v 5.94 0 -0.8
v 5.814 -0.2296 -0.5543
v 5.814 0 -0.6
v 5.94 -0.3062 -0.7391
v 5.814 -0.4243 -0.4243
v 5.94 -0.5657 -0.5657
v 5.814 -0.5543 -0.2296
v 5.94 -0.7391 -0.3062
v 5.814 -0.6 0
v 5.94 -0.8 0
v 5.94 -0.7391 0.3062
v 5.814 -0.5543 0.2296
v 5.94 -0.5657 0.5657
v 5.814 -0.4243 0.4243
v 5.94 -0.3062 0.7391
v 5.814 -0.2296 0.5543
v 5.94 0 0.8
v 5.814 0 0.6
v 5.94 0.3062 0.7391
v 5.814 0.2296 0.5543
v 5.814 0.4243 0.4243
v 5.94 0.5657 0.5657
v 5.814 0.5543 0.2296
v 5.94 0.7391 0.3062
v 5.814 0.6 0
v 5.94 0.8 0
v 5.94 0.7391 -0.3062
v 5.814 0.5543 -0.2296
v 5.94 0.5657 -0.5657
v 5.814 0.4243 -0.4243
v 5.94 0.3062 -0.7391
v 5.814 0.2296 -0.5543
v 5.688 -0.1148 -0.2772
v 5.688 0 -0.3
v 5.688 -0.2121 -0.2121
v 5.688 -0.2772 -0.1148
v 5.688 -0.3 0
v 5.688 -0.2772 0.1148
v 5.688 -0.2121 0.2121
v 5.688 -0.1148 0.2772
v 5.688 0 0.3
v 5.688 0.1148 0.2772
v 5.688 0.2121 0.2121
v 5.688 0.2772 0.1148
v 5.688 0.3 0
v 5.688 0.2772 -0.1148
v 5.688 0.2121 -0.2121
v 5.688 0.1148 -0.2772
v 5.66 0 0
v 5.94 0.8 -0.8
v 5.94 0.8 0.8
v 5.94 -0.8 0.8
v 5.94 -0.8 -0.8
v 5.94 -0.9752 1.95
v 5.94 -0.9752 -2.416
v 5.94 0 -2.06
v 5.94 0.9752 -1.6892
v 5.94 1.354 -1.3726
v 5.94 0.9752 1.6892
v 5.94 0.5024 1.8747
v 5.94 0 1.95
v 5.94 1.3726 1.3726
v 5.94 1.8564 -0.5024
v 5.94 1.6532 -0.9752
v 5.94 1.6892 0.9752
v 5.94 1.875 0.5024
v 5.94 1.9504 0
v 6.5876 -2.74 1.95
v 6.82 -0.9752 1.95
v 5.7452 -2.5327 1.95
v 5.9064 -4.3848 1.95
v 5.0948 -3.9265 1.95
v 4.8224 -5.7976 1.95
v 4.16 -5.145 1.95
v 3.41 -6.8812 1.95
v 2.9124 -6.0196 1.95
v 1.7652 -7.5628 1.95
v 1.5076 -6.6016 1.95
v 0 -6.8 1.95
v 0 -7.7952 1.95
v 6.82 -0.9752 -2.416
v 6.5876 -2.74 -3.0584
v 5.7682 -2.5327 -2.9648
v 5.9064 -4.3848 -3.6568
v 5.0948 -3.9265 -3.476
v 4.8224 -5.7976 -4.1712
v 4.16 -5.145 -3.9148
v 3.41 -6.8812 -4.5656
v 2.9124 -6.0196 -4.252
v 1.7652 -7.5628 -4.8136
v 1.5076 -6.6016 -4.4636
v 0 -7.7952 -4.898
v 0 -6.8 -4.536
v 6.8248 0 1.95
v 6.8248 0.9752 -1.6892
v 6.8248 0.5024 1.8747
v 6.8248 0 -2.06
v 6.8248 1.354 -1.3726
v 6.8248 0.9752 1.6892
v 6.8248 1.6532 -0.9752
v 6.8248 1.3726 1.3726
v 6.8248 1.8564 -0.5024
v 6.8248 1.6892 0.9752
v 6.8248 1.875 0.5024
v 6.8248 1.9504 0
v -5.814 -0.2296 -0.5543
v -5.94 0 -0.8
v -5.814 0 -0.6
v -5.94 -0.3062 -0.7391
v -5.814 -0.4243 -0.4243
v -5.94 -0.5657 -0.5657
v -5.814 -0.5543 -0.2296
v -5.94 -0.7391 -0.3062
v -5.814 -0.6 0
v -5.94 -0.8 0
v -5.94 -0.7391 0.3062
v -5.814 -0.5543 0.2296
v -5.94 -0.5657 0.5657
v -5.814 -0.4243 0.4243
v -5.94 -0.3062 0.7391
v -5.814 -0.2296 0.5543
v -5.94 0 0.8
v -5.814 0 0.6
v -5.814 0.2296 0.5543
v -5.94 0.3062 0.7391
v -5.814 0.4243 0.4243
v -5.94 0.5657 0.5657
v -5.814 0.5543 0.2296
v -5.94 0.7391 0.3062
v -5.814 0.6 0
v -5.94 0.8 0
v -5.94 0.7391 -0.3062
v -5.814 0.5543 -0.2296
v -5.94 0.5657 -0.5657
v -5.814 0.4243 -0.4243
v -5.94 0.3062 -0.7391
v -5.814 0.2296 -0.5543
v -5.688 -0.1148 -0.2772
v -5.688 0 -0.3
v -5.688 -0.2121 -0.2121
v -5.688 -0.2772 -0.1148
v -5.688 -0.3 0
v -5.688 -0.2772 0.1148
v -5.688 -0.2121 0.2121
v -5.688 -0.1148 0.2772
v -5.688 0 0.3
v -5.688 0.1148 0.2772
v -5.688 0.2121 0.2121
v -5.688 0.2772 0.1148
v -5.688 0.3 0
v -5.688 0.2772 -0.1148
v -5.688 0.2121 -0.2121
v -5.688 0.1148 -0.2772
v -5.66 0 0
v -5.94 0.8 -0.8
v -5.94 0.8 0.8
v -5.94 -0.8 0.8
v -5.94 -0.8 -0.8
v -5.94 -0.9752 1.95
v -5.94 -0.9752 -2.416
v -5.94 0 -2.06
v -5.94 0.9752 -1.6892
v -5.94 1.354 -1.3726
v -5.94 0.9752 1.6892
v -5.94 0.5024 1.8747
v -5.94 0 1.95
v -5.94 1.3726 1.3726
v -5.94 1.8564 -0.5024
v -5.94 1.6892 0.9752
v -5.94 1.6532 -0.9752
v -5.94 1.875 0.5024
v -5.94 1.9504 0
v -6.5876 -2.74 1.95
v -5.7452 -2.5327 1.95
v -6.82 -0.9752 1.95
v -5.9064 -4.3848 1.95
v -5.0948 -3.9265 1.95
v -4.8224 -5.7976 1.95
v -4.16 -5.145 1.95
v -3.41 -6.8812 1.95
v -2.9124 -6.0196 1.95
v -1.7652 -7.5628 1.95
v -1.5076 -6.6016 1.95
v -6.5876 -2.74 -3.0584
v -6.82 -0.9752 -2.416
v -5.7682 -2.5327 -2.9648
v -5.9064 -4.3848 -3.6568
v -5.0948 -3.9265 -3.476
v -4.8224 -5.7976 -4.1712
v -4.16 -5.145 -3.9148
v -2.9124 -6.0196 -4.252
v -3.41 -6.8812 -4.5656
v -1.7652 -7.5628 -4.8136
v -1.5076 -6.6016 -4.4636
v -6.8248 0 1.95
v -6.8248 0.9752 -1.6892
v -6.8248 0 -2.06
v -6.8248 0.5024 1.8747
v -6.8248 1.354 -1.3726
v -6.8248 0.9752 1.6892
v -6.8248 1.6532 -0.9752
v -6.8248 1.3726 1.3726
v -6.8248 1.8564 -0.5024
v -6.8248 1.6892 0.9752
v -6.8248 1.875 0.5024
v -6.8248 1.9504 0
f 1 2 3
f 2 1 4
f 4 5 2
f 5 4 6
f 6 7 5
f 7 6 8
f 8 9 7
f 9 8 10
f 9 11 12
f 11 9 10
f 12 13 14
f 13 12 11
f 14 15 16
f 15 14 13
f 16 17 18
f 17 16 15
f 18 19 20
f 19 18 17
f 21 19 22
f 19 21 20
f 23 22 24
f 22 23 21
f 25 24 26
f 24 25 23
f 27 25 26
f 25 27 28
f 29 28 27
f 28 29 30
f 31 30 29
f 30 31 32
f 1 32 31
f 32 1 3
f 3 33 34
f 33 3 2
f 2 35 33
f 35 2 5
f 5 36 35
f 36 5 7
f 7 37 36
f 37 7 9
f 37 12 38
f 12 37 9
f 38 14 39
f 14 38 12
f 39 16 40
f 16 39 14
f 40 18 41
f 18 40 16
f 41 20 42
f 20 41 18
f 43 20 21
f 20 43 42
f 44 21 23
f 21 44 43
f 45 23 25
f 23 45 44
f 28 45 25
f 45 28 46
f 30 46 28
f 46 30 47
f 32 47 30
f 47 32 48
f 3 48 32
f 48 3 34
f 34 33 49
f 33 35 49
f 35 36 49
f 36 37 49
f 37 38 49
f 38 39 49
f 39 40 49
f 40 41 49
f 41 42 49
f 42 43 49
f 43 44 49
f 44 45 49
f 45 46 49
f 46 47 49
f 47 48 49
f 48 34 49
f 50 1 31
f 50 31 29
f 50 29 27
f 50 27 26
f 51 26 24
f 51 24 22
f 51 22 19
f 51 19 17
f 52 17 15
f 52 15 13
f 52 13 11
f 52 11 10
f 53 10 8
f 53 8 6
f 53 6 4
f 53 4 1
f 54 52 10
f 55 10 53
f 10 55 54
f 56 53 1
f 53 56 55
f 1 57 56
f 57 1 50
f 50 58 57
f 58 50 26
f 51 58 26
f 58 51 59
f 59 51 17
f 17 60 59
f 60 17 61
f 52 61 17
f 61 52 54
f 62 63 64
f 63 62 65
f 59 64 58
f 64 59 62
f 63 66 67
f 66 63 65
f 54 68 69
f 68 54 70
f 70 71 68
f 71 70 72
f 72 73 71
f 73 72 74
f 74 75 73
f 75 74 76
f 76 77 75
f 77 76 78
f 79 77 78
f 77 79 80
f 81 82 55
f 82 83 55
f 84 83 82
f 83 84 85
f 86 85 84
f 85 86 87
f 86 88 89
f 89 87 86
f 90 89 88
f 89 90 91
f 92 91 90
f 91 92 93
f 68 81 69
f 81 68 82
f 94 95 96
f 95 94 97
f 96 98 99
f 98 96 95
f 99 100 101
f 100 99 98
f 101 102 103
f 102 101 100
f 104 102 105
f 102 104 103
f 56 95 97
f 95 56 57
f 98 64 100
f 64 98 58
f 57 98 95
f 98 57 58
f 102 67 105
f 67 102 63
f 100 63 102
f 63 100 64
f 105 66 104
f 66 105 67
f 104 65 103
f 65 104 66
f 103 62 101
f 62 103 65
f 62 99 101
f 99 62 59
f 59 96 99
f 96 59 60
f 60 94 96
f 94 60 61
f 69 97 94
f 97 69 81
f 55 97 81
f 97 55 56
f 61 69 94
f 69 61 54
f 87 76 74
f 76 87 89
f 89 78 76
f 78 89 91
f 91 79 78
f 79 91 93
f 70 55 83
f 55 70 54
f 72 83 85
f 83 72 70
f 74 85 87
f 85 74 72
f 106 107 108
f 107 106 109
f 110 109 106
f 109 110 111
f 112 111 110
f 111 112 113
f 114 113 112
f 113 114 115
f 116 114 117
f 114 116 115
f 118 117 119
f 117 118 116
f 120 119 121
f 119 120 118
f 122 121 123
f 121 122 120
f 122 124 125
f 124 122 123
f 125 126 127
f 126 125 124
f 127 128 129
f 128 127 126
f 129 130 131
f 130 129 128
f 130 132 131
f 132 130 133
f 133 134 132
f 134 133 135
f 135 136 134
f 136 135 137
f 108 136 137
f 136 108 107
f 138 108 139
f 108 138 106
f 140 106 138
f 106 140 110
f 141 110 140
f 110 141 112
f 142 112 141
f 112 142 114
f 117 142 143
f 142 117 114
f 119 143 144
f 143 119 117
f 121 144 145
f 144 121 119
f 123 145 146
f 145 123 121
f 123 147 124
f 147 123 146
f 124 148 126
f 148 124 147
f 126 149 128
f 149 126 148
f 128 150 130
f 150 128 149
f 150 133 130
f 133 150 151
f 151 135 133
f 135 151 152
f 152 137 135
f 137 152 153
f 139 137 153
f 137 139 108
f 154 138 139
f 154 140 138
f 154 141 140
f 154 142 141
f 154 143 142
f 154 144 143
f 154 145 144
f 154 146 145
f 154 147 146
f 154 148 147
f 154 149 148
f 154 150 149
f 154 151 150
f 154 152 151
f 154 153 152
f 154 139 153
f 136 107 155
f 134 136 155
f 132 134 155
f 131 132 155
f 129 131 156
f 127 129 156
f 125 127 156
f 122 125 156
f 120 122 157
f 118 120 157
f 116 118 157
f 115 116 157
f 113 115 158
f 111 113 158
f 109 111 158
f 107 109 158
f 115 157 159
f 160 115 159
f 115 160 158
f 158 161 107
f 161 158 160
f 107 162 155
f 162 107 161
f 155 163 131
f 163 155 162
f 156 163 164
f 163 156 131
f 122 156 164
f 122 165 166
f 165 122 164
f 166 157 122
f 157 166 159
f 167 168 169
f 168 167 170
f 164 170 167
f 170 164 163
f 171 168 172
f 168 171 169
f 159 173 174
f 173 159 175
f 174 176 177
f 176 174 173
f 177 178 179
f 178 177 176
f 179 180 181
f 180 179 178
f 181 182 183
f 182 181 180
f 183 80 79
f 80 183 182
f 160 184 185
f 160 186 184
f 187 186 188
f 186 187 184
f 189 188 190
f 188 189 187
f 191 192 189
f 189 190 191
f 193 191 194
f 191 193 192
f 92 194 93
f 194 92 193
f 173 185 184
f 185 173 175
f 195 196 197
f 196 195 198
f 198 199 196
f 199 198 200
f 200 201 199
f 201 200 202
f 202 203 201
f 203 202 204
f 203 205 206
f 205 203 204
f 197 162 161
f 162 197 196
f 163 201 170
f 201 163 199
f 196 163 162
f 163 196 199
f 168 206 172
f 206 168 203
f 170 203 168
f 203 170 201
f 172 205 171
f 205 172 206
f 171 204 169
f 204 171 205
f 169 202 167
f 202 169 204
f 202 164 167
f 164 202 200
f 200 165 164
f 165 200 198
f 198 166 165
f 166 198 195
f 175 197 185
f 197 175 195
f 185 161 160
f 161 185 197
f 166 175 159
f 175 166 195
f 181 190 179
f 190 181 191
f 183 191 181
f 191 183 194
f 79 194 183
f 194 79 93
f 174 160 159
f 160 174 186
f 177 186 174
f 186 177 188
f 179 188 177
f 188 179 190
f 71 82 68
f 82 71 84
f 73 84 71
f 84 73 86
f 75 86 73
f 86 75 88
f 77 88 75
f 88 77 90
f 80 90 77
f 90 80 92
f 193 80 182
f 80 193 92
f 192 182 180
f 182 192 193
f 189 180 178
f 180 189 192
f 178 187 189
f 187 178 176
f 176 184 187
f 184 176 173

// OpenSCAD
// file: ../p/4-4edge.scad
use <../lib.scad>
function ldraw_lib__4_4edge() = [
// 0 Circle 1.0
// 0 Name: 4-4edge.dat
// 0 Author: James Jessiman
// 0 !LDRAW_ORG Primitive UPDATE 2017-01
// 0 !LICENSE Licensed under CC BY 2.0 and CC BY 4.0 : see CAreadme.txt
// 
// 0 BFC CERTIFY CCW
  [0,"BFC","CERTIFY"],
  [0,"BFC","CCW"],
// 
// 0 !HISTORY 1998-12-15 [PTadmin] Official Update 1998-10
// 0 !HISTORY 2005-12-28 [PTadmin] Official Update 2005-01
// 0 !HISTORY 2007-06-24 [PTadmin] Header formatted for Contributor Agreement
// 0 !HISTORY 2008-07-01 [PTadmin] Official Update 2008-01
// 0 !HISTORY 2017-01-15 [Steffen] BFCed
// 0 !HISTORY 2017-12-30 [PTadmin] Official Update 2017-01
// 
// 
// 2 24 1 0 0 0.9239 0 0.3827
  [2,24,1,0,0,0.9239,0,0.3827],
// 2 24 0.9239 0 0.3827 0.7071 0 0.7071
  [2,24,0.9239,0,0.3827,0.7071,0,0.7071],
// 2 24 0.7071 0 0.7071 0.3827 0 0.9239
  [2,24,0.7071,0,0.7071,0.3827,0,0.9239],
// 2 24 0.3827 0 0.9239 0 0 1
  [2,24,0.3827,0,0.9239,0,0,1],
// 2 24 0 0 1 -0.3827 0 0.9239
  [2,24,0,0,1,-0.3827,0,0.9239],
// 2 24 -0.3827 0 0.9239 -0.7071 0 0.7071
  [2,24,-0.3827,0,0.9239,-0.7071,0,0.7071],
// 2 24 -0.7071 0 0.7071 -0.9239 0 0.3827
  [2,24,-0.7071,0,0.7071,-0.9239,0,0.3827],
// 2 24 -0.9239 0 0.3827 -1 0 -0
  [2,24,-0.9239,0,0.3827,-1,0,-0],
// 2 24 -1 0 -0 -0.9239 0 -0.3827
  [2,24,-1,0,-0,-0.9239,0,-0.3827],
// 2 24 -0.9239 0 -0.3827 -0.7071 0 -0.7071
  [2,24,-0.9239,0,-0.3827,-0.7071,0,-0.7071],
// 2 24 -0.7071 0 -0.7071 -0.3827 0 -0.9239
  [2,24,-0.7071,0,-0.7071,-0.3827,0,-0.9239],
// 2 24 -0.3827 0 -0.9239 0 0 -1
  [2,24,-0.3827,0,-0.9239,0,0,-1],
// 2 24 0 0 -1 0.3827 0 -0.9239
  [2,24,0,0,-1,0.3827,0,-0.9239],
// 2 24 0.3827 0 -0.9239 0.7071 0 -0.7071
  [2,24,0.3827,0,-0.9239,0.7071,0,-0.7071],
// 2 24 0.7071 0 -0.7071 0.9239 0 -0.3827
  [2,24,0.7071,0,-0.7071,0.9239,0,-0.3827],
// 2 24 0.9239 0 -0.3827 1 0 0
  [2,24,0.9239,0,-0.3827,1,0,0],
];
module ldraw_lib__4_4edge(step=0, col=false, unit=2/5, alt=false, line=0.2, solid=!$preview)
    makepoly(ldraw_lib__4_4edge(), step=step, col=col, unit=unit, alt=alt, line=line, solid=solid);
ldraw_lib__4_4edge(line=0.2);
// file: ../p/4-4con3.scad
use <../lib.scad>
function ldraw_lib__4_4con3() = [
// 0 Cone  3 x 1.0
// 0 Name: 4-4con3.dat
// 0 Author: Niels Karsdorp [nielsk]
// 0 !LDRAW_ORG Primitive UPDATE 2003-02
// 0 !LICENSE Licensed under CC BY 4.0 : see CAreadme.txt
// 
// 0 BFC CERTIFY CCW
  [0,"BFC","CERTIFY"],
  [0,"BFC","CCW"],
// 
// 0 !HISTORY 2003-08-01 [PTadmin] Official Update 2003-02
// 0 !HISTORY 2007-06-24 [PTadmin] Header formatted for Contributor Agreement
// 0 !HISTORY 2008-07-01 [PTadmin] Official Update 2008-01
// 
// 
// 5 24 3 1 0 4 0 0 2.7717 1 1.1481 2.7717 1 -1.1481
  [5,24,3,1,0,4,0,0,2.7717,1,1.1481,2.7717,1,-1.1481],
// 5 24 2.7717 1 1.1481 3.6956 0 1.5308 2.1213 1 2.1213 3 1 0
  [5,24,2.7717,1,1.1481,3.6956,0,1.5308,2.1213,1,2.1213,3,1,0],
// 5 24 2.1213 1 2.1213 2.8284 0 2.8284 1.1481 1 2.7717 2.7717 1 1.1481
  [5,24,2.1213,1,2.1213,2.8284,0,2.8284,1.1481,1,2.7717,2.7717,1,1.1481],
// 5 24 1.1481 1 2.7717 1.5308 0 3.6956 0 1 3 2.1213 1 2.1213
  [5,24,1.1481,1,2.7717,1.5308,0,3.6956,0,1,3,2.1213,1,2.1213],
// 5 24 0 1 3 0 0 4 -1.1481 1 2.7717 1.1481 1 2.7717
  [5,24,0,1,3,0,0,4,-1.1481,1,2.7717,1.1481,1,2.7717],
// 5 24 -1.1481 1 2.7717 -1.5308 0 3.6956 -2.1213 1 2.1213 0 1 3
  [5,24,-1.1481,1,2.7717,-1.5308,0,3.6956,-2.1213,1,2.1213,0,1,3],
// 5 24 -2.1213 1 2.1213 -2.8284 0 2.8284 -2.7717 1 1.1481 -1.1481 1 2.7717
  [5,24,-2.1213,1,2.1213,-2.8284,0,2.8284,-2.7717,1,1.1481,-1.1481,1,2.7717],
// 5 24 -2.7717 1 1.1481 -3.6956 0 1.5308 -3 1 0 -2.1213 1 2.1213
  [5,24,-2.7717,1,1.1481,-3.6956,0,1.5308,-3,1,0,-2.1213,1,2.1213],
// 5 24 -3 1 0 -4 0 0 -2.7717 1 -1.1481 -2.7717 1 1.1481
  [5,24,-3,1,0,-4,0,0,-2.7717,1,-1.1481,-2.7717,1,1.1481],
// 5 24 -2.7717 1 -1.1481 -3.6956 0 -1.5308 -2.1213 1 -2.1213 -3 1 0
  [5,24,-2.7717,1,-1.1481,-3.6956,0,-1.5308,-2.1213,1,-2.1213,-3,1,0],
// 5 24 -2.1213 1 -2.1213 -2.8284 0 -2.8284 -1.1481 1 -2.7717 -2.7717 1 -1.1481
  [5,24,-2.1213,1,-2.1213,-2.8284,0,-2.8284,-1.1481,1,-2.7717,-2.7717,1,-1.1481],
// 5 24 -1.1481 1 -2.7717 -1.5308 0 -3.6956 0 1 -3 -2.1213 1 -2.1213
  [5,24,-1.1481,1,-2.7717,-1.5308,0,-3.6956,0,1,-3,-2.1213,1,-2.1213],
// 5 24 0 1 -3 0 0 -4 1.1481 1 -2.7717 -1.1481 1 -2.7717
  [5,24,0,1,-3,0,0,-4,1.1481,1,-2.7717,-1.1481,1,-2.7717],
// 5 24 1.1481 1 -2.7717 1.5308 0 -3.6956 2.1213 1 -2.1213 0 1 -3
  [5,24,1.1481,1,-2.7717,1.5308,0,-3.6956,2.1213,1,-2.1213,0,1,-3],
// 5 24 2.1213 1 -2.1213 2.8284 0 -2.8284 2.7717 1 -1.1481 1.1481 1 -2.7717
  [5,24,2.1213,1,-2.1213,2.8284,0,-2.8284,2.7717,1,-1.1481,1.1481,1,-2.7717],
// 5 24 2.7717 1 -1.1481 3.6956 0 -1.5308 3 1 0 2.1213 1 -2.1213
  [5,24,2.7717,1,-1.1481,3.6956,0,-1.5308,3,1,0,2.1213,1,-2.1213],
// 
// 4 16 3 1 0 2.7717 1 1.1481 3.6956 0 1.5308 4 0 0
  [4,16,3,1,0,2.7717,1,1.1481,3.6956,0,1.5308,4,0,0],
// 4 16 2.7717 1 1.1481 2.1213 1 2.1213 2.8284 0 2.8284 3.6956 0 1.5308
  [4,16,2.7717,1,1.1481,2.1213,1,2.1213,2.8284,0,2.8284,3.6956,0,1.5308],
// 4 16 2.1213 1 2.1213 1.1481 1 2.7717 1.5308 0 3.6956 2.8284 0 2.8284
  [4,16,2.1213,1,2.1213,1.1481,1,2.7717,1.5308,0,3.6956,2.8284,0,2.8284],
// 4 16 1.1481 1 2.7717 0 1 3 0 0 4 1.5308 0 3.6956
  [4,16,1.1481,1,2.7717,0,1,3,0,0,4,1.5308,0,3.6956],
// 4 16 0 1 3 -1.1481 1 2.7717 -1.5308 0 3.6956 0 0 4
  [4,16,0,1,3,-1.1481,1,2.7717,-1.5308,0,3.6956,0,0,4],
// 4 16 -1.1481 1 2.7717 -2.1213 1 2.1213 -2.8284 0 2.8284 -1.5308 0 3.6956
  [4,16,-1.1481,1,2.7717,-2.1213,1,2.1213,-2.8284,0,2.8284,-1.5308,0,3.6956],
// 4 16 -2.1213 1 2.1213 -2.7717 1 1.1481 -3.6956 0 1.5308 -2.8284 0 2.8284
  [4,16,-2.1213,1,2.1213,-2.7717,1,1.1481,-3.6956,0,1.5308,-2.8284,0,2.8284],
// 4 16 -2.7717 1 1.1481 -3 1 0 -4 0 0 -3.6956 0 1.5308
  [4,16,-2.7717,1,1.1481,-3,1,0,-4,0,0,-3.6956,0,1.5308],
// 4 16 -3 1 0 -2.7717 1 -1.1481 -3.6956 0 -1.5308 -4 0 0
  [4,16,-3,1,0,-2.7717,1,-1.1481,-3.6956,0,-1.5308,-4,0,0],
// 4 16 -2.7717 1 -1.1481 -2.1213 1 -2.1213 -2.8284 0 -2.8284 -3.6956 0 -1.5308
  [4,16,-2.7717,1,-1.1481,-2.1213,1,-2.1213,-2.8284,0,-2.8284,-3.6956,0,-1.5308],
// 4 16 -2.1213 1 -2.1213 -1.1481 1 -2.7717 -1.5308 0 -3.6956 -2.8284 0 -2.8284
  [4,16,-2.1213,1,-2.1213,-1.1481,1,-2.7717,-1.5308,0,-3.6956,-2.8284,0,-2.8284],
// 4 16 -1.1481 1 -2.7717 0 1 -3 0 0 -4 -1.5308 0 -3.6956
  [4,16,-1.1481,1,-2.7717,0,1,-3,0,0,-4,-1.5308,0,-3.6956],
// 4 16 0 1 -3 1.1481 1 -2.7717 1.5308 0 -3.6956 0 0 -4
  [4,16,0,1,-3,1.1481,1,-2.7717,1.5308,0,-3.6956,0,0,-4],
// 4 16 1.1481 1 -2.7717 2.1213 1 -2.1213 2.8284 0 -2.8284 1.5308 0 -3.6956
  [4,16,1.1481,1,-2.7717,2.1213,1,-2.1213,2.8284,0,-2.8284,1.5308,0,-3.6956],
// 4 16 2.1213 1 -2.1213 2.7717 1 -1.1481 3.6956 0 -1.5308 2.8284 0 -2.8284
  [4,16,2.1213,1,-2.1213,2.7717,1,-1.1481,3.6956,0,-1.5308,2.8284,0,-2.8284],
// 4 16 2.7717 1 -1.1481 3 1 0 4 0 0 3.6956 0 -1.5308
  [4,16,2.7717,1,-1.1481,3,1,0,4,0,0,3.6956,0,-1.5308],
// 
// 0
// 
];
module ldraw_lib__4_4con3(step=0, col=false, unit=2/5, alt=false, line=0.2, solid=!$preview)
    makepoly(ldraw_lib__4_4con3(), step=step, col=col, unit=unit, alt=alt, line=line, solid=solid);
ldraw_lib__4_4con3(line=0.2);
// file: ../p/4-4con1.scad
use <../lib.scad>
function ldraw_lib__4_4con1() = [
// 0 Cone  1 x 1.0
// 0 Name: 4-4con1.dat
// 0 Author: Steve Bliss [sbliss]
// 0 !LDRAW_ORG Primitive UPDATE 2012-01
// 0 !LICENSE Licensed under CC BY 4.0 : see CAreadme.txt
// 
// 0 BFC CERTIFY CCW
  [0,"BFC","CERTIFY"],
  [0,"BFC","CCW"],
// 
// 0 !HISTORY 1999-08-19 [sbliss] Renamed 4-4con12.dat to 4-4con1.dat, Moved all conditional lines before quads
// 0 !HISTORY 2000-05-07 [PTadmin] Official Update 2000-01
// 0 !HISTORY 2002-12-11 [cwdee] Standardised title and made BFC compliant
// 0 !HISTORY 2003-08-01 [PTadmin] Official Update 2003-02
// 0 !HISTORY 2007-06-24 [PTadmin] Header formatted for Contributor Agreement
// 0 !HISTORY 2008-07-01 [PTadmin] Official Update 2008-01
// 0 !HISTORY 2012-02-16 [Philo] Changed to CCW, reordered
// 0 !HISTORY 2012-03-30 [PTadmin] Official Update 2012-01
// 
// 
// 5 24 1 1 0 2 0 0 0.9239 1 -0.3827 0.9239 1 0.3827
  [5,24,1,1,0,2,0,0,0.9239,1,-0.3827,0.9239,1,0.3827],
// 5 24 0.9239 1 0.3827 1.8478 0 0.7654 1 1 0 0.7071 1 0.7071
  [5,24,0.9239,1,0.3827,1.8478,0,0.7654,1,1,0,0.7071,1,0.7071],
// 5 24 0.7071 1 0.7071 1.4142 0 1.4142 0.9239 1 0.3827 0.3827 1 0.9239
  [5,24,0.7071,1,0.7071,1.4142,0,1.4142,0.9239,1,0.3827,0.3827,1,0.9239],
// 5 24 0.3827 1 0.9239 0.7654 0 1.8478 0.7071 1 0.7071 0 1 1
  [5,24,0.3827,1,0.9239,0.7654,0,1.8478,0.7071,1,0.7071,0,1,1],
// 5 24 0 1 1 0 0 2 0.3827 1 0.9239 -0.3827 1 0.9239
  [5,24,0,1,1,0,0,2,0.3827,1,0.9239,-0.3827,1,0.9239],
// 5 24 -0.3827 1 0.9239 -0.7654 0 1.8478 0 1 1 -0.7071 1 0.7071
  [5,24,-0.3827,1,0.9239,-0.7654,0,1.8478,0,1,1,-0.7071,1,0.7071],
// 5 24 -0.7071 1 0.7071 -1.4142 0 1.4142 -0.3827 1 0.9239 -0.9239 1 0.3827
  [5,24,-0.7071,1,0.7071,-1.4142,0,1.4142,-0.3827,1,0.9239,-0.9239,1,0.3827],
// 5 24 -0.9239 1 0.3827 -1.8478 0 0.7654 -0.7071 1 0.7071 -1 1 0
  [5,24,-0.9239,1,0.3827,-1.8478,0,0.7654,-0.7071,1,0.7071,-1,1,0],
// 5 24 -1 1 0 -2 0 0 -0.9239 1 0.3827 -0.9239 1 -0.3827
  [5,24,-1,1,0,-2,0,0,-0.9239,1,0.3827,-0.9239,1,-0.3827],
// 5 24 -0.9239 1 -0.3827 -1.8478 0 -0.7654 -1 1 0 -0.7071 1 -0.7071
  [5,24,-0.9239,1,-0.3827,-1.8478,0,-0.7654,-1,1,0,-0.7071,1,-0.7071],
// 5 24 -0.7071 1 -0.7071 -1.4142 0 -1.4142 -0.9239 1 -0.3827 -0.3827 1 -0.9239
  [5,24,-0.7071,1,-0.7071,-1.4142,0,-1.4142,-0.9239,1,-0.3827,-0.3827,1,-0.9239],
// 5 24 -0.3827 1 -0.9239 -0.7654 0 -1.8478 -0.7071 1 -0.7071 0 1 -1
  [5,24,-0.3827,1,-0.9239,-0.7654,0,-1.8478,-0.7071,1,-0.7071,0,1,-1],
// 5 24 0 1 -1 0 0 -2 -0.3827 1 -0.9239 0.3827 1 -0.9239
  [5,24,0,1,-1,0,0,-2,-0.3827,1,-0.9239,0.3827,1,-0.9239],
// 5 24 0.3827 1 -0.9239 0.7654 0 -1.8478 0 1 -1 0.7071 1 -0.7071
  [5,24,0.3827,1,-0.9239,0.7654,0,-1.8478,0,1,-1,0.7071,1,-0.7071],
// 5 24 0.7071 1 -0.7071 1.4142 0 -1.4142 0.3827 1 -0.9239 0.9239 1 -0.3827
  [5,24,0.7071,1,-0.7071,1.4142,0,-1.4142,0.3827,1,-0.9239,0.9239,1,-0.3827],
// 5 24 0.9239 1 -0.3827 1.8478 0 -0.7654 0.7071 1 -0.7071 1 1 0
  [5,24,0.9239,1,-0.3827,1.8478,0,-0.7654,0.7071,1,-0.7071,1,1,0],
// 
// 4 16 2 0 0 1 1 0 0.9239 1 0.3827 1.8478 0 0.7654
  [4,16,2,0,0,1,1,0,0.9239,1,0.3827,1.8478,0,0.7654],
// 4 16 1.8478 0 0.7654 0.9239 1 0.3827 0.7071 1 0.7071 1.4142 0 1.4142
  [4,16,1.8478,0,0.7654,0.9239,1,0.3827,0.7071,1,0.7071,1.4142,0,1.4142],
// 4 16 1.4142 0 1.4142 0.7071 1 0.7071 0.3827 1 0.9239 0.7654 0 1.8478
  [4,16,1.4142,0,1.4142,0.7071,1,0.7071,0.3827,1,0.9239,0.7654,0,1.8478],
// 4 16 0.7654 0 1.8478 0.3827 1 0.9239 0 1 1 0 0 2
  [4,16,0.7654,0,1.8478,0.3827,1,0.9239,0,1,1,0,0,2],
// 4 16 0 0 2 0 1 1 -0.3827 1 0.9239 -0.7654 0 1.8478
  [4,16,0,0,2,0,1,1,-0.3827,1,0.9239,-0.7654,0,1.8478],
// 4 16 -0.7654 0 1.8478 -0.3827 1 0.9239 -0.7071 1 0.7071 -1.4142 0 1.4142
  [4,16,-0.7654,0,1.8478,-0.3827,1,0.9239,-0.7071,1,0.7071,-1.4142,0,1.4142],
// 4 16 -1.4142 0 1.4142 -0.7071 1 0.7071 -0.9239 1 0.3827 -1.8478 0 0.7654
  [4,16,-1.4142,0,1.4142,-0.7071,1,0.7071,-0.9239,1,0.3827,-1.8478,0,0.7654],
// 4 16 -1.8478 0 0.7654 -0.9239 1 0.3827 -1 1 0 -2 0 0
  [4,16,-1.8478,0,0.7654,-0.9239,1,0.3827,-1,1,0,-2,0,0],
// 4 16 -2 0 0 -1 1 0 -0.9239 1 -0.3827 -1.8478 0 -0.7654
  [4,16,-2,0,0,-1,1,0,-0.9239,1,-0.3827,-1.8478,0,-0.7654],
// 4 16 -1.8478 0 -0.7654 -0.9239 1 -0.3827 -0.7071 1 -0.7071 -1.4142 0 -1.4142
  [4,16,-1.8478,0,-0.7654,-0.9239,1,-0.3827,-0.7071,1,-0.7071,-1.4142,0,-1.4142],
// 4 16 -1.4142 0 -1.4142 -0.7071 1 -0.7071 -0.3827 1 -0.9239 -0.7654 0 -1.8478
  [4,16,-1.4142,0,-1.4142,-0.7071,1,-0.7071,-0.3827,1,-0.9239,-0.7654,0,-1.8478],
// 4 16 -0.7654 0 -1.8478 -0.3827 1 -0.9239 0 1 -1 0 0 -2
  [4,16,-0.7654,0,-1.8478,-0.3827,1,-0.9239,0,1,-1,0,0,-2],
// 4 16 0 0 -2 0 1 -1 0.3827 1 -0.9239 0.7654 0 -1.8478
  [4,16,0,0,-2,0,1,-1,0.3827,1,-0.9239,0.7654,0,-1.8478],
// 4 16 0.7654 0 -1.8478 0.3827 1 -0.9239 0.7071 1 -0.7071 1.4142 0 -1.4142
  [4,16,0.7654,0,-1.8478,0.3827,1,-0.9239,0.7071,1,-0.7071,1.4142,0,-1.4142],
// 4 16 1.4142 0 -1.4142 0.7071 1 -0.7071 0.9239 1 -0.3827 1.8478 0 -0.7654
  [4,16,1.4142,0,-1.4142,0.7071,1,-0.7071,0.9239,1,-0.3827,1.8478,0,-0.7654],
// 4 16 1.8478 0 -0.7654 0.9239 1 -0.3827 1 1 0 2 0 0
  [4,16,1.8478,0,-0.7654,0.9239,1,-0.3827,1,1,0,2,0,0],
];
module ldraw_lib__4_4con1(step=0, col=false, unit=2/5, alt=false, line=0.2, solid=!$preview)
    makepoly(ldraw_lib__4_4con1(), step=step, col=col, unit=unit, alt=alt, line=line, solid=solid);
ldraw_lib__4_4con1(line=0.2);
// file: ../p/4-4con0.scad
use <../lib.scad>
function ldraw_lib__4_4con0() = [
// 0 Cone  0 x 1.0
// 0 Name: 4-4con0.dat
// 0 Author: William Howard [WilliamH]
// 0 !LDRAW_ORG Primitive UPDATE 2009-03
// 0 !LICENSE Licensed under CC BY 2.0 and CC BY 4.0 : see CAreadme.txt
// 
// 0 BFC CERTIFY CCW
  [0,"BFC","CERTIFY"],
  [0,"BFC","CCW"],
// 
// 0 !HISTORY 2009-12-29 [PTadmin] Official Update 2009-03
// 
// 
// 3 16 0 1 0 0.9239 0 0.3827 1 0 0
  [3,16,0,1,0,0.9239,0,0.3827,1,0,0],
// 3 16 0 1 0 0.7071 0 0.7071 0.9239 0 0.3827
  [3,16,0,1,0,0.7071,0,0.7071,0.9239,0,0.3827],
// 3 16 0 1 0 0.3827 0 0.9239 0.7071 0 0.7071
  [3,16,0,1,0,0.3827,0,0.9239,0.7071,0,0.7071],
// 3 16 0 1 0 0 0 1 0.3827 0 0.9239
  [3,16,0,1,0,0,0,1,0.3827,0,0.9239],
// 3 16 0 1 0 -0.3827 0 0.9239 0 0 1
  [3,16,0,1,0,-0.3827,0,0.9239,0,0,1],
// 3 16 0 1 0 -0.7071 0 0.7071 -0.3827 0 0.9239
  [3,16,0,1,0,-0.7071,0,0.7071,-0.3827,0,0.9239],
// 3 16 0 1 0 -0.9239 0 0.3827 -0.7071 0 0.7071
  [3,16,0,1,0,-0.9239,0,0.3827,-0.7071,0,0.7071],
// 3 16 0 1 0 -1 0 0 -0.9239 0 0.3827
  [3,16,0,1,0,-1,0,0,-0.9239,0,0.3827],
// 3 16 0 1 0 -0.9239 0 -0.3827 -1 0 0
  [3,16,0,1,0,-0.9239,0,-0.3827,-1,0,0],
// 3 16 0 1 0 -0.7071 0 -0.7071 -0.9239 0 -0.3827
  [3,16,0,1,0,-0.7071,0,-0.7071,-0.9239,0,-0.3827],
// 3 16 0 1 0 -0.3827 0 -0.9239 -0.7071 0 -0.7071
  [3,16,0,1,0,-0.3827,0,-0.9239,-0.7071,0,-0.7071],
// 3 16 0 1 0 0 0 -1 -0.3827 0 -0.9239
  [3,16,0,1,0,0,0,-1,-0.3827,0,-0.9239],
// 3 16 0 1 0 0.3827 0 -0.9239 0 0 -1
  [3,16,0,1,0,0.3827,0,-0.9239,0,0,-1],
// 3 16 0 1 0 0.7071 0 -0.7071 0.3827 0 -0.9239
  [3,16,0,1,0,0.7071,0,-0.7071,0.3827,0,-0.9239],
// 3 16 0 1 0 0.9239 0 -0.3827 0.7071 0 -0.7071
  [3,16,0,1,0,0.9239,0,-0.3827,0.7071,0,-0.7071],
// 3 16 0 1 0 1 0 0 0.9239 0 -0.3827
  [3,16,0,1,0,1,0,0,0.9239,0,-0.3827],
// 
// 0 conditional lines
// 5 24 0 1 0 1 0 0 0.9239 0 -0.3827 0.9239 0 0.3827
  [5,24,0,1,0,1,0,0,0.9239,0,-0.3827,0.9239,0,0.3827],
// 5 24 0 1 0 0.9239 0 0.3827 1 0 0 0.7071 0 0.7071
  [5,24,0,1,0,0.9239,0,0.3827,1,0,0,0.7071,0,0.7071],
// 5 24 0 1 0 0.7071 0 0.7071 0.9239 0 0.3827 0.3827 0 0.9239
  [5,24,0,1,0,0.7071,0,0.7071,0.9239,0,0.3827,0.3827,0,0.9239],
// 5 24 0 1 0 0.3827 0 0.9239 0.7071 0 0.7071 0 0 1
  [5,24,0,1,0,0.3827,0,0.9239,0.7071,0,0.7071,0,0,1],
// 5 24 0 1 0 0 0 1 0.3827 0 0.9239 -0.3827 0 0.9239
  [5,24,0,1,0,0,0,1,0.3827,0,0.9239,-0.3827,0,0.9239],
// 5 24 0 1 0 -0.3827 0 0.9239 0 0 1 -0.7071 0 0.7071
  [5,24,0,1,0,-0.3827,0,0.9239,0,0,1,-0.7071,0,0.7071],
// 5 24 0 1 0 -0.7071 0 0.7071 -0.3827 0 0.9239 -0.9239 0 0.3827
  [5,24,0,1,0,-0.7071,0,0.7071,-0.3827,0,0.9239,-0.9239,0,0.3827],
// 5 24 0 1 0 -0.9239 0 0.3827 -0.7071 0 0.7071 -1 0 0
  [5,24,0,1,0,-0.9239,0,0.3827,-0.7071,0,0.7071,-1,0,0],
// 5 24 0 1 0 -1 0 0 -0.9239 0 0.3827 -0.9239 0 -0.3827
  [5,24,0,1,0,-1,0,0,-0.9239,0,0.3827,-0.9239,0,-0.3827],
// 5 24 0 1 0 -0.9239 0 -0.3827 -1 0 0 -0.7071 0 -0.7071
  [5,24,0,1,0,-0.9239,0,-0.3827,-1,0,0,-0.7071,0,-0.7071],
// 5 24 0 1 0 -0.7071 0 -0.7071 -0.9239 0 -0.3827 -0.3827 0 -0.9239
  [5,24,0,1,0,-0.7071,0,-0.7071,-0.9239,0,-0.3827,-0.3827,0,-0.9239],
// 5 24 0 1 0 -0.3827 0 -0.9239 -0.7071 0 -0.7071 0 0 -1
  [5,24,0,1,0,-0.3827,0,-0.9239,-0.7071,0,-0.7071,0,0,-1],
// 5 24 0 1 0 0 0 -1 -0.3827 0 -0.9239 0.3827 0 -0.9239
  [5,24,0,1,0,0,0,-1,-0.3827,0,-0.9239,0.3827,0,-0.9239],
// 5 24 0 1 0 0.3827 0 -0.9239 0 0 -1 0.7071 0 -0.7071
  [5,24,0,1,0,0.3827,0,-0.9239,0,0,-1,0.7071,0,-0.7071],
// 5 24 0 1 0 0.7071 0 -0.7071 0.3827 0 -0.9239 0.9239 0 -0.3827
  [5,24,0,1,0,0.7071,0,-0.7071,0.3827,0,-0.9239,0.9239,0,-0.3827],
// 5 24 0 1 0 0.9239 0 -0.3827 0.7071 0 -0.7071 1 0 0
  [5,24,0,1,0,0.9239,0,-0.3827,0.7071,0,-0.7071,1,0,0],
// 
// 0 end of file
];
makepoly(ldraw_lib__4_4con0(), line=0.2);
// file: ../p/bump5000.scad
use <../lib.scad>
use <4-4con0.scad>
use <4-4con1.scad>
use <4-4con3.scad>
use <4-4edge.scad>
$fa=1; $fs=0.2;
function ldraw_lib__bump5000(realsolid=false) = [
// 0 Bump 1.0 x 0.5
// 0 Name: bump5000.dat
// 0 Author: Magnus Forsberg [MagFors]
// 0 !LDRAW_ORG Primitive UPDATE 2010-02
// 0 !LICENSE Licensed under CC BY 2.0 and CC BY 4.0 : see CAreadme.txt
// 
// 0 !HELP This file creates a bump with radius= 1 and height= 0.5 LDU
// 
// 0 BFC CERTIFY CCW
  [0,"BFC","CERTIFY"],
  [0,"BFC","CCW"],
// 
// 0 !HISTORY 2010-07-05 [PTadmin] Official Update 2010-02
// 
// 
// 1 16 0 0 0 0.25 0 0 0 -0.225 0 0 0 -0.25 4-4con3.dat
  [1,16,0,0,0,0.25,0,0,0,-0.225,0,0,0,-0.25, ldraw_lib__4_4con3(realsolid)],
// 1 16 0 -0.225 0 0.375 0 0 0 -0.225 0 0 0 -0.375 4-4con1.dat
  [1,16,0,-0.225,0,0.375,0,0,0,-0.225,0,0,0,-0.375, ldraw_lib__4_4con1(realsolid)],
// 1 16 0 -0.45 0 0.375 0 0 0 -0.05 0 0 0 -0.375 4-4con0.dat
  [1,16,0,-0.45,0,0.375,0,0,0,-0.05,0,0,0,-0.375, ldraw_lib__4_4con0(realsolid)],
// 1 16 0 0 0 1 0 0 0 1 0 0 0 1 4-4edge.dat
  [1,16,0,0,0,1,0,0,0,1,0,0,0,1, ldraw_lib__4_4edge(realsolid)],
// 5 24 0.692925 -0.225 -0.287025 0.75 -0.225 0 0.9239 0 -0.3827 0.375 -0.45 0
  [5,24,0.692925,-0.225,-0.287025,0.75,-0.225,0,0.9239,0,-0.3827,0.375,-0.45,0],
// 5 24 0.530325 -0.225 -0.530325 0.692925 -0.225 -0.287025 0.7071 0 -0.7071 0.3464625 -0.45 -0.1435125
  [5,24,0.530325,-0.225,-0.530325,0.692925,-0.225,-0.287025,0.7071,0,-0.7071,0.3464625,-0.45,-0.1435125],
// 5 24 0.287025 -0.225 -0.692925 0.530325 -0.225 -0.530325 0.3827 0 -0.9239 0.2651625 -0.45 -0.2651625
  [5,24,0.287025,-0.225,-0.692925,0.530325,-0.225,-0.530325,0.3827,0,-0.9239,0.2651625,-0.45,-0.2651625],
// 5 24 0 -0.225 -0.75 0.287025 -0.225 -0.692925 0 0 -1 0.1435125 -0.45 -0.3464625
  [5,24,0,-0.225,-0.75,0.287025,-0.225,-0.692925,0,0,-1,0.1435125,-0.45,-0.3464625],
// 5 24 -0.287025 -0.225 -0.692925 0 -0.225 -0.75 -0.3827 0 -0.9239 0 -0.45 -0.375
  [5,24,-0.287025,-0.225,-0.692925,0,-0.225,-0.75,-0.3827,0,-0.9239,0,-0.45,-0.375],
// 5 24 -0.530325 -0.225 -0.530325 -0.287025 -0.225 -0.692925 -0.7071 0 -0.7071 -0.1435125 -0.45 -0.3464625
  [5,24,-0.530325,-0.225,-0.530325,-0.287025,-0.225,-0.692925,-0.7071,0,-0.7071,-0.1435125,-0.45,-0.3464625],
// 5 24 -0.692925 -0.225 -0.287025 -0.530325 -0.225 -0.530325 -0.9239 0 -0.3827 -0.2651625 -0.45 -0.2651625
  [5,24,-0.692925,-0.225,-0.287025,-0.530325,-0.225,-0.530325,-0.9239,0,-0.3827,-0.2651625,-0.45,-0.2651625],
// 5 24 -0.75 -0.225 0 -0.692925 -0.225 -0.287025 -1 0 0 -0.3464625 -0.45 -0.1435125
  [5,24,-0.75,-0.225,0,-0.692925,-0.225,-0.287025,-1,0,0,-0.3464625,-0.45,-0.1435125],
// 5 24 -0.692925 -0.225 0.287025 -0.75 -0.225 0 -0.9239 0 0.3827 -0.375 -0.45 0
  [5,24,-0.692925,-0.225,0.287025,-0.75,-0.225,0,-0.9239,0,0.3827,-0.375,-0.45,0],
// 5 24 -0.530325 -0.225 0.530325 -0.692925 -0.225 0.287025 -0.7071 0 0.7071 -0.3464625 -0.45 0.1435125
  [5,24,-0.530325,-0.225,0.530325,-0.692925,-0.225,0.287025,-0.7071,0,0.7071,-0.3464625,-0.45,0.1435125],
// 5 24 -0.287025 -0.225 0.692925 -0.530325 -0.225 0.530325 -0.3827 0 0.9239 -0.2651625 -0.45 0.2651625
  [5,24,-0.287025,-0.225,0.692925,-0.530325,-0.225,0.530325,-0.3827,0,0.9239,-0.2651625,-0.45,0.2651625],
// 5 24 0 -0.225 0.75 -0.287025 -0.225 0.692925 0 0 1 -0.1435125 -0.45 0.3464625
  [5,24,0,-0.225,0.75,-0.287025,-0.225,0.692925,0,0,1,-0.1435125,-0.45,0.3464625],
// 5 24 0.287025 -0.225 0.692925 0 -0.225 0.75 0.3827 0 0.9239 0 -0.45 0.375
  [5,24,0.287025,-0.225,0.692925,0,-0.225,0.75,0.3827,0,0.9239,0,-0.45,0.375],
// 5 24 0.530325 -0.225 0.530325 0.287025 -0.225 0.692925 0.7071 0 0.7071 0.1435125 -0.45 0.3464625
  [5,24,0.530325,-0.225,0.530325,0.287025,-0.225,0.692925,0.7071,0,0.7071,0.1435125,-0.45,0.3464625],
// 5 24 0.692925 -0.225 0.287025 0.530325 -0.225 0.530325 0.9239 0 0.3827 0.2651625 -0.45 0.2651625
  [5,24,0.692925,-0.225,0.287025,0.530325,-0.225,0.530325,0.9239,0,0.3827,0.2651625,-0.45,0.2651625],
// 5 24 0.75 -0.225 0 0.692925 -0.225 0.287025 1 0 0 0.3464625 -0.45 0.1435125
  [5,24,0.75,-0.225,0,0.692925,-0.225,0.287025,1,0,0,0.3464625,-0.45,0.1435125],
// 5 24 0 -0.45 -0.375 -0.1435125 -0.45 -0.3464625 -0.287025 -0.225 -0.692925 0 -0.5 0
  [5,24,0,-0.45,-0.375,-0.1435125,-0.45,-0.3464625,-0.287025,-0.225,-0.692925,0,-0.5,0],
// 5 24 -0.1435125 -0.45 -0.3464625 -0.2651625 -0.45 -0.2651625 -0.530325 -0.225 -0.530325 0 -0.5 0
  [5,24,-0.1435125,-0.45,-0.3464625,-0.2651625,-0.45,-0.2651625,-0.530325,-0.225,-0.530325,0,-0.5,0],
// 5 24 -0.2651625 -0.45 -0.2651625 -0.3464625 -0.45 -0.1435125 -0.692925 -0.225 -0.287025 0 -0.5 0
  [5,24,-0.2651625,-0.45,-0.2651625,-0.3464625,-0.45,-0.1435125,-0.692925,-0.225,-0.287025,0,-0.5,0],
// 5 24 -0.3464625 -0.45 -0.1435125 -0.375 -0.45 0 -0.75 -0.225 0 0 -0.5 0
  [5,24,-0.3464625,-0.45,-0.1435125,-0.375,-0.45,0,-0.75,-0.225,0,0,-0.5,0],
// 5 24 -0.375 -0.45 0 -0.3464625 -0.45 0.1435125 -0.692925 -0.225 0.287025 0 -0.5 0
  [5,24,-0.375,-0.45,0,-0.3464625,-0.45,0.1435125,-0.692925,-0.225,0.287025,0,-0.5,0],
// 5 24 -0.3464625 -0.45 0.1435125 -0.2651625 -0.45 0.2651625 -0.530325 -0.225 0.530325 0 -0.5 0
  [5,24,-0.3464625,-0.45,0.1435125,-0.2651625,-0.45,0.2651625,-0.530325,-0.225,0.530325,0,-0.5,0],
// 5 24 -0.2651625 -0.45 0.2651625 -0.1435125 -0.45 0.3464625 -0.287025 -0.225 0.692925 0 -0.5 0
  [5,24,-0.2651625,-0.45,0.2651625,-0.1435125,-0.45,0.3464625,-0.287025,-0.225,0.692925,0,-0.5,0],
// 5 24 -0.1435125 -0.45 0.3464625 0 -0.45 0.375 0 -0.225 0.75 0 -0.5 0
  [5,24,-0.1435125,-0.45,0.3464625,0,-0.45,0.375,0,-0.225,0.75,0,-0.5,0],
// 5 24 0 -0.45 0.375 0.1435125 -0.45 0.3464625 0.287025 -0.225 0.692925 0 -0.5 0
  [5,24,0,-0.45,0.375,0.1435125,-0.45,0.3464625,0.287025,-0.225,0.692925,0,-0.5,0],
// 5 24 0.1435125 -0.45 0.3464625 0.2651625 -0.45 0.2651625 0.530325 -0.225 0.530325 0 -0.5 0
  [5,24,0.1435125,-0.45,0.3464625,0.2651625,-0.45,0.2651625,0.530325,-0.225,0.530325,0,-0.5,0],
// 5 24 0.2651625 -0.45 0.2651625 0.3464625 -0.45 0.1435125 0.692925 -0.225 0.287025 0 -0.5 0
  [5,24,0.2651625,-0.45,0.2651625,0.3464625,-0.45,0.1435125,0.692925,-0.225,0.287025,0,-0.5,0],
// 5 24 0.3464625 -0.45 0.1435125 0.375 -0.45 0 0.75 -0.225 0 0 -0.5 0
  [5,24,0.3464625,-0.45,0.1435125,0.375,-0.45,0,0.75,-0.225,0,0,-0.5,0],
// 5 24 0.375 -0.45 0 0.3464625 -0.45 -0.1435125 0.692925 -0.225 -0.287025 0 -0.5 0
  [5,24,0.375,-0.45,0,0.3464625,-0.45,-0.1435125,0.692925,-0.225,-0.287025,0,-0.5,0],
// 5 24 0.3464625 -0.45 -0.1435125 0.2651625 -0.45 -0.2651625 0.530325 -0.225 -0.530325 0 -0.5 0
  [5,24,0.3464625,-0.45,-0.1435125,0.2651625,-0.45,-0.2651625,0.530325,-0.225,-0.530325,0,-0.5,0],
// 5 24 0.2651625 -0.45 -0.2651625 0.1435125 -0.45 -0.3464625 0.287025 -0.225 -0.692925 0 -0.5 0
  [5,24,0.2651625,-0.45,-0.2651625,0.1435125,-0.45,-0.3464625,0.287025,-0.225,-0.692925,0,-0.5,0],
// 5 24 0.1435125 -0.45 -0.3464625 0 -0.45 -0.375 0 -0.225 -0.75 0 -0.5 0
  [5,24,0.1435125,-0.45,-0.3464625,0,-0.45,-0.375,0,-0.225,-0.75,0,-0.5,0],
];
module ldraw_lib__bump5000(step=0, col=false, unit=2/5, alt=false, line=0.2, solid=!$preview)
    makepoly(ldraw_lib__bump5000(solid), step=step, col=col, unit=unit, alt=alt, line=line, solid=solid);
ldraw_lib__bump5000(line=0.2);
// file: ../p/4-4ndis.scad
use <../lib.scad>
function ldraw_lib__4_4ndis() = [
// 0 Disc Negative 1.0
// 0 Name: 4-4ndis.dat
// 0 Author: James Jessiman
// 0 !LDRAW_ORG Primitive UPDATE 2012-01
// 0 !LICENSE Licensed under CC BY 2.0 and CC BY 4.0 : see CAreadme.txt
// 
// 0 BFC CERTIFY CCW
  [0,"BFC","CERTIFY"],
  [0,"BFC","CCW"],
// 
// 0 !HISTORY 2002-03-23 [sbliss] Added BFC statement; compacted code
// 0 !HISTORY 2002-04-25 [PTadmin] Official Update 2002-02
// 0 !HISTORY 2007-06-24 [PTadmin] Header formatted for Contributor Agreement
// 0 !HISTORY 2008-07-01 [PTadmin] Official Update 2008-01
// 0 !HISTORY 2012-02-16 [Philo] Changed to CCW
// 0 !HISTORY 2012-03-30 [PTadmin] Official Update 2012-01
// 
// 
// 3 16 0.9239 0 0.3827 1 0 0 1 0 1
  [3,16,0.9239,0,0.3827,1,0,0,1,0,1],
// 3 16 0.7071 0 0.7071 0.9239 0 0.3827 1 0 1
  [3,16,0.7071,0,0.7071,0.9239,0,0.3827,1,0,1],
// 3 16 0.3827 0 0.9239 0.7071 0 0.7071 1 0 1
  [3,16,0.3827,0,0.9239,0.7071,0,0.7071,1,0,1],
// 3 16 0 0 1 0.3827 0 0.9239 1 0 1
  [3,16,0,0,1,0.3827,0,0.9239,1,0,1],
// 3 16 -0.3827 0 0.9239 0 0 1 -1 0 1
  [3,16,-0.3827,0,0.9239,0,0,1,-1,0,1],
// 3 16 -0.7071 0 0.7071 -0.3827 0 0.9239 -1 0 1
  [3,16,-0.7071,0,0.7071,-0.3827,0,0.9239,-1,0,1],
// 3 16 -0.9239 0 0.3827 -0.7071 0 0.7071 -1 0 1
  [3,16,-0.9239,0,0.3827,-0.7071,0,0.7071,-1,0,1],
// 3 16 -1 0 0 -0.9239 0 0.3827 -1 0 1
  [3,16,-1,0,0,-0.9239,0,0.3827,-1,0,1],
// 3 16 -0.9239 0 -0.3827 -1 0 0 -1 0 -1
  [3,16,-0.9239,0,-0.3827,-1,0,0,-1,0,-1],
// 3 16 -0.7071 0 -0.7071 -0.9239 0 -0.3827 -1 0 -1
  [3,16,-0.7071,0,-0.7071,-0.9239,0,-0.3827,-1,0,-1],
// 3 16 -0.3827 0 -0.9239 -0.7071 0 -0.7071 -1 0 -1
  [3,16,-0.3827,0,-0.9239,-0.7071,0,-0.7071,-1,0,-1],
// 3 16 0 0 -1 -0.3827 0 -0.9239 -1 0 -1
  [3,16,0,0,-1,-0.3827,0,-0.9239,-1,0,-1],
// 3 16 0.3827 0 -0.9239 0 0 -1 1 0 -1
  [3,16,0.3827,0,-0.9239,0,0,-1,1,0,-1],
// 3 16 0.7071 0 -0.7071 0.3827 0 -0.9239 1 0 -1
  [3,16,0.7071,0,-0.7071,0.3827,0,-0.9239,1,0,-1],
// 3 16 0.9239 0 -0.3827 0.7071 0 -0.7071 1 0 -1
  [3,16,0.9239,0,-0.3827,0.7071,0,-0.7071,1,0,-1],
// 3 16 1 0 0 0.9239 0 -0.3827 1 0 -1
  [3,16,1,0,0,0.9239,0,-0.3827,1,0,-1],
];
module ldraw_lib__4_4ndis(step=0, col=false, unit=2/5, alt=false, line=0.2, solid=!$preview)
    makepoly(ldraw_lib__4_4ndis(), step=step, col=col, unit=unit, alt=alt, line=line, solid=solid);
ldraw_lib__4_4ndis(line=0.2);
// file: s/2447bs01.scad
use <../../lib.scad>
use <2447bs02.scad>
function ldraw_lib__s__2447bs01() = [
// 0 ~Minifig Helmet Visor Standard without Front Surface
// 0 Name: s\2447bs01.dat
// 0 Author: Magnus Forsberg [MagFors]
// 0 !LDRAW_ORG Subpart UPDATE 2024-07
// 0 !LICENSE Licensed under CC BY 4.0 : see CAreadme.txt
// 
// 0 BFC CERTIFY CCW
  [0,"BFC","CERTIFY"],
  [0,"BFC","CCW"],
// 
// 0 !HISTORY 2024-08-26 [OrionP] Official Update 2024-07
// 
// 1 16 0 0 0 1 0 0 0 1 0 0 0 1 s\2447bs02.dat
  [1,16,0,0,0,1,0,0,0,1,0,0,0,1, ldraw_lib__s__2447bs02()],
// 1 16 0 0 0 -1 0 0 0 1 0 0 0 1 s\2447bs02.dat
  [1,16,0,0,0,-1,0,0,0,1,0,0,0,1, ldraw_lib__s__2447bs02()],
// 5 24 0 12.245 -19.488 0 -4.875 -19.488 4.413 -4.875 -18.907 -4.413 12.034 -18.907
  [5,24,0,12.245,-19.488,0,-4.875,-19.488,4.413,-4.875,-18.907,-4.413,12.034,-18.907],
// 5 24 0 -4.875 -17 0 11.34 -17 3.769 -4.875 -16.504 -3.769 11.159 -16.504
  [5,24,0,-4.875,-17,0,11.34,-17,3.769,-4.875,-16.504,-3.769,11.159,-16.504],
];
module ldraw_lib__s__2447bs01(step=0, col=false, unit=2/5, alt=false, line=0.2, solid=!$preview)
    makepoly(ldraw_lib__s__2447bs01(), step=step, col=col, unit=unit, alt=alt, line=line, solid=solid);
ldraw_lib__s__2447bs01(line=0.2);
// main file
use <../lib.scad>
use <s/2447bs01.scad>
function ldraw_lib__2447b() = [
// 0 Minifig Helmet Visor Standard
// 0 Name: 2447b.dat
// 0 Author: Magnus Forsberg [MagFors]
// 0 !LDRAW_ORG Part UPDATE 2024-07
// 0 !LICENSE Licensed under CC BY 4.0 : see CAreadme.txt
// 
// 0 !HELP alternative part numbers; 25361, 35334, 59456, 70651, 88407
// 
// 0 BFC CERTIFY CCW
  [0,"BFC","CERTIFY"],
  [0,"BFC","CCW"],
// 
// 0 !KEYWORDS BrickLink 2447, Rebrickable 2447
// 
// 0 !HISTORY 2013-08-14 {LEGO Digital Designer} Original part shape
// 0 !HISTORY 2024-07-15 [MagFors] File preparation for LDraw Parts Tracker
// 0 !HISTORY 2024-08-26 [OrionP] Official Update 2024-07
// 
// 1 16 0 0 0 1 0 0 0 1 0 0 0 1 s\2447bs01.dat
  [1,16,0,0,0,1,0,0,0,1,0,0,0,1, ldraw_lib__s__2447bs01()],
// 4 16 16.469 7.646 -6.85 16.469 -4.875 -6.85 14.766 -4.875 -10.962 14.766 9.142 -10.962
  [4,16,16.469,7.646,-6.85,16.469,-4.875,-6.85,14.766,-4.875,-10.962,14.766,9.142,-10.962],
// 4 16 12.056 -4.875 -14.494 12.056 10.428 -14.494 14.766 9.142 -10.962 14.766 -4.875 -10.962
  [4,16,12.056,-4.875,-14.494,12.056,10.428,-14.494,14.766,9.142,-10.962,14.766,-4.875,-10.962],
// 4 16 8.525 -4.875 -17.203 8.525 11.414 -17.203 12.056 10.428 -14.494 12.056 -4.875 -14.494
  [4,16,8.525,-4.875,-17.203,8.525,11.414,-17.203,12.056,10.428,-14.494,12.056,-4.875,-14.494],
// 4 16 4.413 -4.875 -18.907 4.413 12.034 -18.907 8.525 11.414 -17.203 8.525 -4.875 -17.203
  [4,16,4.413,-4.875,-18.907,4.413,12.034,-18.907,8.525,11.414,-17.203,8.525,-4.875,-17.203],
// 4 16 0 -4.875 -19.488 0 12.245 -19.488 4.413 12.034 -18.907 4.413 -4.875 -18.907
  [4,16,0,-4.875,-19.488,0,12.245,-19.488,4.413,12.034,-18.907,4.413,-4.875,-18.907],
// 4 16 -4.413 -4.875 -18.907 -4.413 12.034 -18.907 0 12.245 -19.488 0 -4.875 -19.488
  [4,16,-4.413,-4.875,-18.907,-4.413,12.034,-18.907,0,12.245,-19.488,0,-4.875,-19.488],
// 4 16 -4.413 12.034 -18.907 -4.413 -4.875 -18.907 -8.525 -4.875 -17.203 -8.525 11.414 -17.203
  [4,16,-4.413,12.034,-18.907,-4.413,-4.875,-18.907,-8.525,-4.875,-17.203,-8.525,11.414,-17.203],
// 4 16 -8.525 11.414 -17.203 -8.525 -4.875 -17.203 -12.056 -4.875 -14.494 -12.056 10.428 -14.494
  [4,16,-8.525,11.414,-17.203,-8.525,-4.875,-17.203,-12.056,-4.875,-14.494,-12.056,10.428,-14.494],
// 4 16 -12.056 10.428 -14.494 -12.056 -4.875 -14.494 -14.766 -4.875 -10.962 -14.766 9.142 -10.962
  [4,16,-12.056,10.428,-14.494,-12.056,-4.875,-14.494,-14.766,-4.875,-10.962,-14.766,9.142,-10.962],
// 4 16 -16.469 -4.875 -6.85 -16.469 7.646 -6.85 -14.766 9.142 -10.962 -14.766 -4.875 -10.962
  [4,16,-16.469,-4.875,-6.85,-16.469,7.646,-6.85,-14.766,9.142,-10.962,-14.766,-4.875,-10.962],
// 
];
module ldraw_lib__2447b(step=0, col=false, unit=2/5, alt=false, line=0.2, solid=!$preview)
    makepoly(ldraw_lib__2447b(), step=step, col=col, unit=unit, alt=alt, line=line, solid=solid);
ldraw_lib__2447b(line=0.2);
